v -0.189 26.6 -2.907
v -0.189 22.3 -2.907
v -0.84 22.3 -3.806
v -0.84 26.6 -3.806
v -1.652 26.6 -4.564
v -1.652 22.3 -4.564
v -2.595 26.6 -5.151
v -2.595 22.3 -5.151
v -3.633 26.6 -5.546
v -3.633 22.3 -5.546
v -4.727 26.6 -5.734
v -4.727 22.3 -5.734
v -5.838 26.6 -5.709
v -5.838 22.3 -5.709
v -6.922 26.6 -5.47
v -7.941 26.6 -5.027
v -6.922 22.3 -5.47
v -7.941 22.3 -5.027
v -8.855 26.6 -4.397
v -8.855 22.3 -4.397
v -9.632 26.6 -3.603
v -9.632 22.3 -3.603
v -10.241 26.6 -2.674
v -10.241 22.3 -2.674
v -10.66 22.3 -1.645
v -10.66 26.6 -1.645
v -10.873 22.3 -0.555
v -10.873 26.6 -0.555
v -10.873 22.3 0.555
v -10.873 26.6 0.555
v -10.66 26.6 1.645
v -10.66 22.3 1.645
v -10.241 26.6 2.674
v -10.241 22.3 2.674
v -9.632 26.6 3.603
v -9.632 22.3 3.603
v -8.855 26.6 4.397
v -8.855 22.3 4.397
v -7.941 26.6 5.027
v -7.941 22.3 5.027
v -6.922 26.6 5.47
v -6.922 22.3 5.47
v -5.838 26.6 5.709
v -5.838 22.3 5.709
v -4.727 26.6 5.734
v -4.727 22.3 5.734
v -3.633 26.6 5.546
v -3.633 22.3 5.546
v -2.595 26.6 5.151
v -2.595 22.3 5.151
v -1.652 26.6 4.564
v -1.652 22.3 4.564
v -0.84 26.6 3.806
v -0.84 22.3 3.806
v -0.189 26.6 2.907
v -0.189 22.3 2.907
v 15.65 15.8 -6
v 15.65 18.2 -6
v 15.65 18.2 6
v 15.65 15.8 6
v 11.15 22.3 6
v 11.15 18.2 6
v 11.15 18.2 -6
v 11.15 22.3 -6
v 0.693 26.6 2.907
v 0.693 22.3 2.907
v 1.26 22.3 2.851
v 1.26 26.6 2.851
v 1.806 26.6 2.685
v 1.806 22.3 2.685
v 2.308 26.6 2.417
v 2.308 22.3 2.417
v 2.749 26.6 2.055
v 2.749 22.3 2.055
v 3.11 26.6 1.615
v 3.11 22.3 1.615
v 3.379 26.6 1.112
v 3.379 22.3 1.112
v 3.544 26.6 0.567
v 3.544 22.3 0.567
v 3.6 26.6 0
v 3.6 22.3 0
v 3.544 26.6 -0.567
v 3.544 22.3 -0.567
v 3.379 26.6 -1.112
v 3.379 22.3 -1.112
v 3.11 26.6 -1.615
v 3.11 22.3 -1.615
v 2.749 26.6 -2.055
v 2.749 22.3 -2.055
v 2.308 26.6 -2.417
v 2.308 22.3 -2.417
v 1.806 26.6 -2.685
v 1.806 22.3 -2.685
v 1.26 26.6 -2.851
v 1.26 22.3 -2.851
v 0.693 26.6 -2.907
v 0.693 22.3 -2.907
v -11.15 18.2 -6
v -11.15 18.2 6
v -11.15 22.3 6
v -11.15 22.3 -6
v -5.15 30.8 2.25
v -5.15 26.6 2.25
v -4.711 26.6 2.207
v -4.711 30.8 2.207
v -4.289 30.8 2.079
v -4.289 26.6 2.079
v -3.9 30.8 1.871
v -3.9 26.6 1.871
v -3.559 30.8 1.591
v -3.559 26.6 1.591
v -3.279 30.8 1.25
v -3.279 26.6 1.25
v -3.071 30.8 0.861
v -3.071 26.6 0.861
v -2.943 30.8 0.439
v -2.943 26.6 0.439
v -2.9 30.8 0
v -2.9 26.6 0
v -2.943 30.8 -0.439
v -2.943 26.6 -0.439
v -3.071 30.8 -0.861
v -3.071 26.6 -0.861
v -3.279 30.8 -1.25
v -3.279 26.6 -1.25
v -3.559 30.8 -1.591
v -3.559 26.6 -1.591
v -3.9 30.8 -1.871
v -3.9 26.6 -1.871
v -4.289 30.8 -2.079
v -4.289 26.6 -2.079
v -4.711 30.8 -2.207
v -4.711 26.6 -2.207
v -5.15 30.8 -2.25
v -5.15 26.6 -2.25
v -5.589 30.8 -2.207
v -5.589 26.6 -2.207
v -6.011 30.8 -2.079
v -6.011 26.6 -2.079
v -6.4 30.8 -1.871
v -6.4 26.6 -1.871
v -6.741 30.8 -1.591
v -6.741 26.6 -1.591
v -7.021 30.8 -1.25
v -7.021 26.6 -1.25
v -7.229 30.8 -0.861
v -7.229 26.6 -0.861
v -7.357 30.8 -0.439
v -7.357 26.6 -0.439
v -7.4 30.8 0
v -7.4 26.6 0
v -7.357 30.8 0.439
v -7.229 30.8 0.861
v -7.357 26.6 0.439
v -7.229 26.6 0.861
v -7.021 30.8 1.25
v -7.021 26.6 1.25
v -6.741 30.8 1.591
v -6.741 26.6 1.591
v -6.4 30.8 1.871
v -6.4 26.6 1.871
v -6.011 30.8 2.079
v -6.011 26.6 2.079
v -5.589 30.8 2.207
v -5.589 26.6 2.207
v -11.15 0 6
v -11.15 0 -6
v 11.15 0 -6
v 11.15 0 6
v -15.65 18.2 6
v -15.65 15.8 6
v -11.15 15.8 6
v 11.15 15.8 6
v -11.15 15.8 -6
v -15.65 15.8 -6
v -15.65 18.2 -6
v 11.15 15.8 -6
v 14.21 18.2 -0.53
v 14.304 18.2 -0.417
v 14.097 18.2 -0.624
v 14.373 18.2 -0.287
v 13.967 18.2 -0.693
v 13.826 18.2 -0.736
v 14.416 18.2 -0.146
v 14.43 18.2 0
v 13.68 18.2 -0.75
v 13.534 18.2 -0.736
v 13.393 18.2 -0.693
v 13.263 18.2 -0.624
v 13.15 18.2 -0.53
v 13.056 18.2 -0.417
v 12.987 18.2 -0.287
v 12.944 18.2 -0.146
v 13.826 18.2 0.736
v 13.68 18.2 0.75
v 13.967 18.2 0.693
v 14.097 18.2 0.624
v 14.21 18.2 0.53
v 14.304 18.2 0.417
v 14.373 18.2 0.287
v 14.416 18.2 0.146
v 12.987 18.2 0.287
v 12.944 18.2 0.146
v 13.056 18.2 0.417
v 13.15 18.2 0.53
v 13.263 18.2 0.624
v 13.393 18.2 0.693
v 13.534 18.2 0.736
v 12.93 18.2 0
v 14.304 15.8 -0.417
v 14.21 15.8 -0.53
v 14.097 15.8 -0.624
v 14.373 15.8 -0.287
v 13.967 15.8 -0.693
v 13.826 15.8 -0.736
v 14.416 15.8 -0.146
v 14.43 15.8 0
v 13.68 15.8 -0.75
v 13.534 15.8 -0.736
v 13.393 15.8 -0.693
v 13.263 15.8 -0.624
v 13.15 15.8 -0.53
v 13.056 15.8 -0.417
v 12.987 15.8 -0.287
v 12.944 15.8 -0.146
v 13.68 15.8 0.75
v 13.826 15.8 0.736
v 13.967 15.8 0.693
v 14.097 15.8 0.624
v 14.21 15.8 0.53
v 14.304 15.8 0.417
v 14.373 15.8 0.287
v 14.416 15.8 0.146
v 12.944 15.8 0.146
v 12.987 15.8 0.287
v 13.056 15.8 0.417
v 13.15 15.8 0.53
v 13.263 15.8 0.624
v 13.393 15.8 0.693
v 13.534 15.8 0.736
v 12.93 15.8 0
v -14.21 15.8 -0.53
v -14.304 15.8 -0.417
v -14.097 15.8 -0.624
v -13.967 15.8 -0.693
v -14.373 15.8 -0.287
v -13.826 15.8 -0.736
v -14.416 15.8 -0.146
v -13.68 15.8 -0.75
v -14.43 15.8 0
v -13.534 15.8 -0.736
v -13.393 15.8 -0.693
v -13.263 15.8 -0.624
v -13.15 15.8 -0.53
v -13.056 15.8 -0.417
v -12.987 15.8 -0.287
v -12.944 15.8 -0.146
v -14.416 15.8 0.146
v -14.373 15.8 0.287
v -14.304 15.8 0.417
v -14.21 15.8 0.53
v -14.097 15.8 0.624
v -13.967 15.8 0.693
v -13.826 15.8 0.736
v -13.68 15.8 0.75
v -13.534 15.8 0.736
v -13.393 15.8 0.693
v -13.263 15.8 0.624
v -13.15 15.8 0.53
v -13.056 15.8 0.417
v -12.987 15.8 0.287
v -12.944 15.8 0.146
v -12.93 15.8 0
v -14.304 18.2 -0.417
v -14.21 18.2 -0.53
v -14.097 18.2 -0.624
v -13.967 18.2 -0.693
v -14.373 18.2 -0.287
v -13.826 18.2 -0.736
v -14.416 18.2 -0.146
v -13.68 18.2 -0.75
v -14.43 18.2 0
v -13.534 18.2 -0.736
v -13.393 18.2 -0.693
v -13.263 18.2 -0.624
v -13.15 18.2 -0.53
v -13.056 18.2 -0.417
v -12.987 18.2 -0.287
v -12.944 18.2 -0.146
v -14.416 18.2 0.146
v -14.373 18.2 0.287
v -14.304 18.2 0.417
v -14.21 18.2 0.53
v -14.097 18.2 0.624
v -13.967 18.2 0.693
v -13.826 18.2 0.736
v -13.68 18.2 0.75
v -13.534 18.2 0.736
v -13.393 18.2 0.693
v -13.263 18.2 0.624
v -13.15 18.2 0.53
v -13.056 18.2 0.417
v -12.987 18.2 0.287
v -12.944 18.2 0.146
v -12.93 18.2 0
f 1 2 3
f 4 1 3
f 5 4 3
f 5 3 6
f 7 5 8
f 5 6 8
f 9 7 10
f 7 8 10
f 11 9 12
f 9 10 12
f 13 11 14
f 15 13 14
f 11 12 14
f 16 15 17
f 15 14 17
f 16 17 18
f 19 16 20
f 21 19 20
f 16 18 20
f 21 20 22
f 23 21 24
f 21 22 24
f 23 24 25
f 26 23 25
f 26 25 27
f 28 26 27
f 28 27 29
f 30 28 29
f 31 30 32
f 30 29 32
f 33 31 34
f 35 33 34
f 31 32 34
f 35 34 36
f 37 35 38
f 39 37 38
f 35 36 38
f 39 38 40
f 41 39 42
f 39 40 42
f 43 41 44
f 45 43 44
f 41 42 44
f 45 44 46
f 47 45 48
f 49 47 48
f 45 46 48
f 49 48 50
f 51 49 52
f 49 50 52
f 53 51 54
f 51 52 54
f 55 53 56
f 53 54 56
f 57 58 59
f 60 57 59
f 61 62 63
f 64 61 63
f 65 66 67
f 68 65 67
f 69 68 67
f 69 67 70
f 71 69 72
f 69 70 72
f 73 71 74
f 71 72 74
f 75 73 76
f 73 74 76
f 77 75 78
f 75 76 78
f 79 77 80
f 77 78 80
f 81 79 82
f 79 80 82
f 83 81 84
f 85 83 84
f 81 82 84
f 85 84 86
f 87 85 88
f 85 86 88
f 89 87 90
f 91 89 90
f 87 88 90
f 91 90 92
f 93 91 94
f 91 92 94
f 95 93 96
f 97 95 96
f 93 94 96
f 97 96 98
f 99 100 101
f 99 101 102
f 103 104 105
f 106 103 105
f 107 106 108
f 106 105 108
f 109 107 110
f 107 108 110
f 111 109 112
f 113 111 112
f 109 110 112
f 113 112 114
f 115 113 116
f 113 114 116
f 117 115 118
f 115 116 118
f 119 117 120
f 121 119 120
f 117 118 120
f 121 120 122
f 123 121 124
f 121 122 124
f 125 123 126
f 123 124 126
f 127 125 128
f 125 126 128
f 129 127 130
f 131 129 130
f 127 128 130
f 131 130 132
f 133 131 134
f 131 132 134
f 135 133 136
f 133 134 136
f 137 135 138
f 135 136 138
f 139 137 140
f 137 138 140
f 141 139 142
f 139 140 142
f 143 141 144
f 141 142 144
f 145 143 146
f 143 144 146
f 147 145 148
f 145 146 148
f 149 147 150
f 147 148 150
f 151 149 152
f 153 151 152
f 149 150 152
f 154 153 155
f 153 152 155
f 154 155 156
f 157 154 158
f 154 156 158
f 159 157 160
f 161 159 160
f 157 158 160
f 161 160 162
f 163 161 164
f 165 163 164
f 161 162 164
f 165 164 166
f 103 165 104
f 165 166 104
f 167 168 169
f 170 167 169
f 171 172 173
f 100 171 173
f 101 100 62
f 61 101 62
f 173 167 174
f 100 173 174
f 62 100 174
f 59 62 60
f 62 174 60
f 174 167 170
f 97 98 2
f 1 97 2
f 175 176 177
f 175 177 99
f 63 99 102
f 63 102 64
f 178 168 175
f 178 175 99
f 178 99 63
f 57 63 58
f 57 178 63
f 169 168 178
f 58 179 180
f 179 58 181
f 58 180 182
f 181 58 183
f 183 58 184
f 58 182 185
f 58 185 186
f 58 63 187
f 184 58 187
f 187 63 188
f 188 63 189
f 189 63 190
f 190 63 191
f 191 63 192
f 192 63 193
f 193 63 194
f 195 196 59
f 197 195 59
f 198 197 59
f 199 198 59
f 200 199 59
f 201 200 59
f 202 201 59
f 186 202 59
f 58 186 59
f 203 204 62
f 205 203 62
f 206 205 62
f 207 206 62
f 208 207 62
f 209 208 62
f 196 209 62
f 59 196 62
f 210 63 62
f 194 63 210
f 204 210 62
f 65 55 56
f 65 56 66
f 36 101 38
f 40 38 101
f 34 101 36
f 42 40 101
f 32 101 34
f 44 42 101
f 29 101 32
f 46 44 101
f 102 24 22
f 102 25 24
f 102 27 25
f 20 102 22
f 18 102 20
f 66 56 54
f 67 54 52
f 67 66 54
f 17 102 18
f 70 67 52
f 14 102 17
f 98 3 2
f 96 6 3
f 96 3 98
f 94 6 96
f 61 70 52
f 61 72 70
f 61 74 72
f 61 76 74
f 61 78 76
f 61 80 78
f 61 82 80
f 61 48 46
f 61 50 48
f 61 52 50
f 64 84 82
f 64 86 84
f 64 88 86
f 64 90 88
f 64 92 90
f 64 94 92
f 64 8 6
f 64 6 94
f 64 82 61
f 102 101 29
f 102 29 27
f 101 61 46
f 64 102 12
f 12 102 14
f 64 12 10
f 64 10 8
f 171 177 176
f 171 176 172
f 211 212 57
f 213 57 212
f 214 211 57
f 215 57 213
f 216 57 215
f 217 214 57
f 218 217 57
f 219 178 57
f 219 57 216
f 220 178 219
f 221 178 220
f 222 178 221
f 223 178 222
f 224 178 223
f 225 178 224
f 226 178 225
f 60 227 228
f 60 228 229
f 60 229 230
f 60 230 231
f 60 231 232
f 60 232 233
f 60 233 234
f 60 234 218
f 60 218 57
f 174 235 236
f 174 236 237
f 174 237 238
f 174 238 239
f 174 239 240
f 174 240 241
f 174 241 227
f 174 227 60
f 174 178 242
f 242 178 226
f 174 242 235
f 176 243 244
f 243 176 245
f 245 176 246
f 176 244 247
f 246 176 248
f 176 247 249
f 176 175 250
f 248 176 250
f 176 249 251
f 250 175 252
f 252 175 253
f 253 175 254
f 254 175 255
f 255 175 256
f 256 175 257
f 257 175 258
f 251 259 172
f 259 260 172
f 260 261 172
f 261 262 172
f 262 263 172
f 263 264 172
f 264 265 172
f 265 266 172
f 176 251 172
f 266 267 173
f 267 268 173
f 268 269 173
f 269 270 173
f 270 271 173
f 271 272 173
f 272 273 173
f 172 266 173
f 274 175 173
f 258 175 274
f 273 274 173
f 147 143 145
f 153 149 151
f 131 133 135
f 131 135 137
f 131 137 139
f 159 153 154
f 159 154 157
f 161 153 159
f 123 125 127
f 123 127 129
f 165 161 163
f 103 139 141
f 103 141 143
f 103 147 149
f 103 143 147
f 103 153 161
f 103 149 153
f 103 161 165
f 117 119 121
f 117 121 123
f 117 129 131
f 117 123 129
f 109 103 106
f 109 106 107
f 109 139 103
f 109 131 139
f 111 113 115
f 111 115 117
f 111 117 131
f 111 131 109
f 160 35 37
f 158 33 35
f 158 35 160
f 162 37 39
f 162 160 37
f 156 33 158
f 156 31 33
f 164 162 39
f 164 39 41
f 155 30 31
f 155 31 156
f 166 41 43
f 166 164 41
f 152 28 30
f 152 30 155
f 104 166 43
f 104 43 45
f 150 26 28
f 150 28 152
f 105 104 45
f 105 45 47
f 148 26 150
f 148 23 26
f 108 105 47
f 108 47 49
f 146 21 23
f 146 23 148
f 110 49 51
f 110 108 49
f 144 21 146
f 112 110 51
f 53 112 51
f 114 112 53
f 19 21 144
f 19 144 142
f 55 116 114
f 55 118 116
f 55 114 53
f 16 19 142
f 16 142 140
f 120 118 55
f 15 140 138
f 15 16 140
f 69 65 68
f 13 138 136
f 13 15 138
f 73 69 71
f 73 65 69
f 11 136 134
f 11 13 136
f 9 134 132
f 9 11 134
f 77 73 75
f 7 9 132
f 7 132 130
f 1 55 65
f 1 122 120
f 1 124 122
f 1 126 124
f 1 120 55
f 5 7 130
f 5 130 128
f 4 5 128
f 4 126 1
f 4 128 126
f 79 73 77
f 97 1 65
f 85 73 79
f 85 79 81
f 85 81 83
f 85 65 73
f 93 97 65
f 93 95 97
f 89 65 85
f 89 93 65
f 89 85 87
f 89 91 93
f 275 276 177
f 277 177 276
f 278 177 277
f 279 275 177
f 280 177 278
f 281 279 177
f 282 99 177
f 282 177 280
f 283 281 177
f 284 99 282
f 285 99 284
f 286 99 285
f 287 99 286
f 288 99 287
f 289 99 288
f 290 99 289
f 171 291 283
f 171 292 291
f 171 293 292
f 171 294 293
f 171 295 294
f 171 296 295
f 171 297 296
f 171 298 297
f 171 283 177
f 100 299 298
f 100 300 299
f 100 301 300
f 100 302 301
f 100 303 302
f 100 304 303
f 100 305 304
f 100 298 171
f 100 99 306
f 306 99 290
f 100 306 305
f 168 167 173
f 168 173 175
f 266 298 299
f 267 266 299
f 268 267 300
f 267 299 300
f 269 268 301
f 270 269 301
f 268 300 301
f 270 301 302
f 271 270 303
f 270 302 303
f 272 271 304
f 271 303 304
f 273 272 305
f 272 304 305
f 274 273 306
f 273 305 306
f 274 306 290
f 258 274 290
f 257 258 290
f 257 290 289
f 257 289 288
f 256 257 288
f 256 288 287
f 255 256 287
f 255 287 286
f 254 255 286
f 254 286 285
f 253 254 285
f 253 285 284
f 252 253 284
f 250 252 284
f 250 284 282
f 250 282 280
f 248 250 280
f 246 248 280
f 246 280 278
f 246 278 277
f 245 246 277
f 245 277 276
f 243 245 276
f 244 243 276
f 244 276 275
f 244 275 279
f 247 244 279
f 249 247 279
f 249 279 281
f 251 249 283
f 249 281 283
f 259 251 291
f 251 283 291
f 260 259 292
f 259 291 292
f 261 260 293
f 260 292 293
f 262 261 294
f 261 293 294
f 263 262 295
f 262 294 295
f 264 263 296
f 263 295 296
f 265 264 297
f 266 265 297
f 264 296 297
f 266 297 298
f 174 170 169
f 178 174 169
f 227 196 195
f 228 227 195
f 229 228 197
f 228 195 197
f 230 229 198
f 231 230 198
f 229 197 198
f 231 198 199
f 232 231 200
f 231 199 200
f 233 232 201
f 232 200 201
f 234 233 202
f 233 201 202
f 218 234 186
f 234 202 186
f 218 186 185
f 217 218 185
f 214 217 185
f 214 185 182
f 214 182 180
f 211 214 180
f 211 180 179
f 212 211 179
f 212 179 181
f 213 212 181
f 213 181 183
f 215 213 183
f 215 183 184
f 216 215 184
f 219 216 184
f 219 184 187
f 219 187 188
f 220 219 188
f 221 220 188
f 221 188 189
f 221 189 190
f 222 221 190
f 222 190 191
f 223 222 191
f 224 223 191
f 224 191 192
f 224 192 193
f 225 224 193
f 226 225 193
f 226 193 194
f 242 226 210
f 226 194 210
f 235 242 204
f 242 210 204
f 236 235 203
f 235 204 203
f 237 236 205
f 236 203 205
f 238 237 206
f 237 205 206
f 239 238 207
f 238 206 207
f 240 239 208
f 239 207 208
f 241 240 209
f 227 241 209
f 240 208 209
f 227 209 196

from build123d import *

# Parameters (mm, degrees)
SKETCH1_W           = 22.3
SKETCH1_H           = 12
BOSS_EXTRUDE1_DEPTH = 22.3
SKETCH2_W           = 12
SKETCH2_H           = 2.4
BOSS_EXTRUDE2_DEPTH = 4.5
EXTRUDE_1_DEPTH     = 4.3
SKETCH_1_R          = 0.75
CUT_EXTRUDE_1_DEPTH = 10
SKETCH_2_R          = 2.25
EXTRUDE_2_DEPTH     = 4.2


with BuildPart() as part:
    # Sketch1 → Boss-Extrude1 (new body)
    with BuildSketch(Plane(origin=(0, 0, 0), x_dir=(1, 0, 0), z_dir=(0, 1, 0))):
        Rectangle(SKETCH1_W, SKETCH1_H)
    extrude(amount=BOSS_EXTRUDE1_DEPTH)

    # Sketch2 → Boss-Extrude2 (add)
    with BuildSketch(Plane.ZY.offset(11.15)):
        with Locations((0, 17)):
            Rectangle(SKETCH2_W, SKETCH2_H)
    boss_extrude2 = extrude(amount=BOSS_EXTRUDE2_DEPTH)

    # 镜向1: Boss-Extrude2 across plane
    add(boss_extrude2.mirror(Plane(origin=(0, 0, 0), x_dir=(0, 0, 1), z_dir=(1, 0, 0))))

    # Sketch5 → 凸台-拉伸1 (add)
    with BuildSketch(Plane(origin=(0, 22.3, 0), x_dir=(1, 0, 0), z_dir=(0, 1, 0))):
        with BuildLine():
            Line((0.693260261, 2.906739739), (-0.188814246, 2.906739739))
            ThreePointArc((-0.188814246, 2.906739739), (-10.9, 0), (-0.188814246, -2.906739739))
            Line((-0.188814246, -2.906739739), (0.693260261, -2.906739739))
            ThreePointArc((0.693260261, -2.906739739), (3.6, 0), (0.693260261, 2.906739739))
        make_face()
    extrude(amount=EXTRUDE_1_DEPTH)

    # 草图1 → 切除-拉伸1 (cut)
    with BuildSketch(Plane(origin=(0, 18.2, 0), x_dir=(1, 0, 0), z_dir=(0, 1, 0))):
        with Locations(Location((-13.68, 0, 0), (0, 0, 270))):
            Circle(SKETCH_1_R)
        with Locations(Location((13.68, 0, 0), (0, 0, 270))):
            Circle(SKETCH_1_R)
    extrude(amount=-CUT_EXTRUDE_1_DEPTH, mode=Mode.SUBTRACT)

    # 草图2 → 凸台-拉伸2 (add)
    with BuildSketch(Plane(origin=(0, 26.6, 0), x_dir=(1, 0, 0), z_dir=(0, 1, 0))):
        with Locations(Location((-5.15, 0, 0), (0, 0, 270))):
            Circle(SKETCH_2_R)
    extrude(amount=EXTRUDE_2_DEPTH)


solid = part.part
